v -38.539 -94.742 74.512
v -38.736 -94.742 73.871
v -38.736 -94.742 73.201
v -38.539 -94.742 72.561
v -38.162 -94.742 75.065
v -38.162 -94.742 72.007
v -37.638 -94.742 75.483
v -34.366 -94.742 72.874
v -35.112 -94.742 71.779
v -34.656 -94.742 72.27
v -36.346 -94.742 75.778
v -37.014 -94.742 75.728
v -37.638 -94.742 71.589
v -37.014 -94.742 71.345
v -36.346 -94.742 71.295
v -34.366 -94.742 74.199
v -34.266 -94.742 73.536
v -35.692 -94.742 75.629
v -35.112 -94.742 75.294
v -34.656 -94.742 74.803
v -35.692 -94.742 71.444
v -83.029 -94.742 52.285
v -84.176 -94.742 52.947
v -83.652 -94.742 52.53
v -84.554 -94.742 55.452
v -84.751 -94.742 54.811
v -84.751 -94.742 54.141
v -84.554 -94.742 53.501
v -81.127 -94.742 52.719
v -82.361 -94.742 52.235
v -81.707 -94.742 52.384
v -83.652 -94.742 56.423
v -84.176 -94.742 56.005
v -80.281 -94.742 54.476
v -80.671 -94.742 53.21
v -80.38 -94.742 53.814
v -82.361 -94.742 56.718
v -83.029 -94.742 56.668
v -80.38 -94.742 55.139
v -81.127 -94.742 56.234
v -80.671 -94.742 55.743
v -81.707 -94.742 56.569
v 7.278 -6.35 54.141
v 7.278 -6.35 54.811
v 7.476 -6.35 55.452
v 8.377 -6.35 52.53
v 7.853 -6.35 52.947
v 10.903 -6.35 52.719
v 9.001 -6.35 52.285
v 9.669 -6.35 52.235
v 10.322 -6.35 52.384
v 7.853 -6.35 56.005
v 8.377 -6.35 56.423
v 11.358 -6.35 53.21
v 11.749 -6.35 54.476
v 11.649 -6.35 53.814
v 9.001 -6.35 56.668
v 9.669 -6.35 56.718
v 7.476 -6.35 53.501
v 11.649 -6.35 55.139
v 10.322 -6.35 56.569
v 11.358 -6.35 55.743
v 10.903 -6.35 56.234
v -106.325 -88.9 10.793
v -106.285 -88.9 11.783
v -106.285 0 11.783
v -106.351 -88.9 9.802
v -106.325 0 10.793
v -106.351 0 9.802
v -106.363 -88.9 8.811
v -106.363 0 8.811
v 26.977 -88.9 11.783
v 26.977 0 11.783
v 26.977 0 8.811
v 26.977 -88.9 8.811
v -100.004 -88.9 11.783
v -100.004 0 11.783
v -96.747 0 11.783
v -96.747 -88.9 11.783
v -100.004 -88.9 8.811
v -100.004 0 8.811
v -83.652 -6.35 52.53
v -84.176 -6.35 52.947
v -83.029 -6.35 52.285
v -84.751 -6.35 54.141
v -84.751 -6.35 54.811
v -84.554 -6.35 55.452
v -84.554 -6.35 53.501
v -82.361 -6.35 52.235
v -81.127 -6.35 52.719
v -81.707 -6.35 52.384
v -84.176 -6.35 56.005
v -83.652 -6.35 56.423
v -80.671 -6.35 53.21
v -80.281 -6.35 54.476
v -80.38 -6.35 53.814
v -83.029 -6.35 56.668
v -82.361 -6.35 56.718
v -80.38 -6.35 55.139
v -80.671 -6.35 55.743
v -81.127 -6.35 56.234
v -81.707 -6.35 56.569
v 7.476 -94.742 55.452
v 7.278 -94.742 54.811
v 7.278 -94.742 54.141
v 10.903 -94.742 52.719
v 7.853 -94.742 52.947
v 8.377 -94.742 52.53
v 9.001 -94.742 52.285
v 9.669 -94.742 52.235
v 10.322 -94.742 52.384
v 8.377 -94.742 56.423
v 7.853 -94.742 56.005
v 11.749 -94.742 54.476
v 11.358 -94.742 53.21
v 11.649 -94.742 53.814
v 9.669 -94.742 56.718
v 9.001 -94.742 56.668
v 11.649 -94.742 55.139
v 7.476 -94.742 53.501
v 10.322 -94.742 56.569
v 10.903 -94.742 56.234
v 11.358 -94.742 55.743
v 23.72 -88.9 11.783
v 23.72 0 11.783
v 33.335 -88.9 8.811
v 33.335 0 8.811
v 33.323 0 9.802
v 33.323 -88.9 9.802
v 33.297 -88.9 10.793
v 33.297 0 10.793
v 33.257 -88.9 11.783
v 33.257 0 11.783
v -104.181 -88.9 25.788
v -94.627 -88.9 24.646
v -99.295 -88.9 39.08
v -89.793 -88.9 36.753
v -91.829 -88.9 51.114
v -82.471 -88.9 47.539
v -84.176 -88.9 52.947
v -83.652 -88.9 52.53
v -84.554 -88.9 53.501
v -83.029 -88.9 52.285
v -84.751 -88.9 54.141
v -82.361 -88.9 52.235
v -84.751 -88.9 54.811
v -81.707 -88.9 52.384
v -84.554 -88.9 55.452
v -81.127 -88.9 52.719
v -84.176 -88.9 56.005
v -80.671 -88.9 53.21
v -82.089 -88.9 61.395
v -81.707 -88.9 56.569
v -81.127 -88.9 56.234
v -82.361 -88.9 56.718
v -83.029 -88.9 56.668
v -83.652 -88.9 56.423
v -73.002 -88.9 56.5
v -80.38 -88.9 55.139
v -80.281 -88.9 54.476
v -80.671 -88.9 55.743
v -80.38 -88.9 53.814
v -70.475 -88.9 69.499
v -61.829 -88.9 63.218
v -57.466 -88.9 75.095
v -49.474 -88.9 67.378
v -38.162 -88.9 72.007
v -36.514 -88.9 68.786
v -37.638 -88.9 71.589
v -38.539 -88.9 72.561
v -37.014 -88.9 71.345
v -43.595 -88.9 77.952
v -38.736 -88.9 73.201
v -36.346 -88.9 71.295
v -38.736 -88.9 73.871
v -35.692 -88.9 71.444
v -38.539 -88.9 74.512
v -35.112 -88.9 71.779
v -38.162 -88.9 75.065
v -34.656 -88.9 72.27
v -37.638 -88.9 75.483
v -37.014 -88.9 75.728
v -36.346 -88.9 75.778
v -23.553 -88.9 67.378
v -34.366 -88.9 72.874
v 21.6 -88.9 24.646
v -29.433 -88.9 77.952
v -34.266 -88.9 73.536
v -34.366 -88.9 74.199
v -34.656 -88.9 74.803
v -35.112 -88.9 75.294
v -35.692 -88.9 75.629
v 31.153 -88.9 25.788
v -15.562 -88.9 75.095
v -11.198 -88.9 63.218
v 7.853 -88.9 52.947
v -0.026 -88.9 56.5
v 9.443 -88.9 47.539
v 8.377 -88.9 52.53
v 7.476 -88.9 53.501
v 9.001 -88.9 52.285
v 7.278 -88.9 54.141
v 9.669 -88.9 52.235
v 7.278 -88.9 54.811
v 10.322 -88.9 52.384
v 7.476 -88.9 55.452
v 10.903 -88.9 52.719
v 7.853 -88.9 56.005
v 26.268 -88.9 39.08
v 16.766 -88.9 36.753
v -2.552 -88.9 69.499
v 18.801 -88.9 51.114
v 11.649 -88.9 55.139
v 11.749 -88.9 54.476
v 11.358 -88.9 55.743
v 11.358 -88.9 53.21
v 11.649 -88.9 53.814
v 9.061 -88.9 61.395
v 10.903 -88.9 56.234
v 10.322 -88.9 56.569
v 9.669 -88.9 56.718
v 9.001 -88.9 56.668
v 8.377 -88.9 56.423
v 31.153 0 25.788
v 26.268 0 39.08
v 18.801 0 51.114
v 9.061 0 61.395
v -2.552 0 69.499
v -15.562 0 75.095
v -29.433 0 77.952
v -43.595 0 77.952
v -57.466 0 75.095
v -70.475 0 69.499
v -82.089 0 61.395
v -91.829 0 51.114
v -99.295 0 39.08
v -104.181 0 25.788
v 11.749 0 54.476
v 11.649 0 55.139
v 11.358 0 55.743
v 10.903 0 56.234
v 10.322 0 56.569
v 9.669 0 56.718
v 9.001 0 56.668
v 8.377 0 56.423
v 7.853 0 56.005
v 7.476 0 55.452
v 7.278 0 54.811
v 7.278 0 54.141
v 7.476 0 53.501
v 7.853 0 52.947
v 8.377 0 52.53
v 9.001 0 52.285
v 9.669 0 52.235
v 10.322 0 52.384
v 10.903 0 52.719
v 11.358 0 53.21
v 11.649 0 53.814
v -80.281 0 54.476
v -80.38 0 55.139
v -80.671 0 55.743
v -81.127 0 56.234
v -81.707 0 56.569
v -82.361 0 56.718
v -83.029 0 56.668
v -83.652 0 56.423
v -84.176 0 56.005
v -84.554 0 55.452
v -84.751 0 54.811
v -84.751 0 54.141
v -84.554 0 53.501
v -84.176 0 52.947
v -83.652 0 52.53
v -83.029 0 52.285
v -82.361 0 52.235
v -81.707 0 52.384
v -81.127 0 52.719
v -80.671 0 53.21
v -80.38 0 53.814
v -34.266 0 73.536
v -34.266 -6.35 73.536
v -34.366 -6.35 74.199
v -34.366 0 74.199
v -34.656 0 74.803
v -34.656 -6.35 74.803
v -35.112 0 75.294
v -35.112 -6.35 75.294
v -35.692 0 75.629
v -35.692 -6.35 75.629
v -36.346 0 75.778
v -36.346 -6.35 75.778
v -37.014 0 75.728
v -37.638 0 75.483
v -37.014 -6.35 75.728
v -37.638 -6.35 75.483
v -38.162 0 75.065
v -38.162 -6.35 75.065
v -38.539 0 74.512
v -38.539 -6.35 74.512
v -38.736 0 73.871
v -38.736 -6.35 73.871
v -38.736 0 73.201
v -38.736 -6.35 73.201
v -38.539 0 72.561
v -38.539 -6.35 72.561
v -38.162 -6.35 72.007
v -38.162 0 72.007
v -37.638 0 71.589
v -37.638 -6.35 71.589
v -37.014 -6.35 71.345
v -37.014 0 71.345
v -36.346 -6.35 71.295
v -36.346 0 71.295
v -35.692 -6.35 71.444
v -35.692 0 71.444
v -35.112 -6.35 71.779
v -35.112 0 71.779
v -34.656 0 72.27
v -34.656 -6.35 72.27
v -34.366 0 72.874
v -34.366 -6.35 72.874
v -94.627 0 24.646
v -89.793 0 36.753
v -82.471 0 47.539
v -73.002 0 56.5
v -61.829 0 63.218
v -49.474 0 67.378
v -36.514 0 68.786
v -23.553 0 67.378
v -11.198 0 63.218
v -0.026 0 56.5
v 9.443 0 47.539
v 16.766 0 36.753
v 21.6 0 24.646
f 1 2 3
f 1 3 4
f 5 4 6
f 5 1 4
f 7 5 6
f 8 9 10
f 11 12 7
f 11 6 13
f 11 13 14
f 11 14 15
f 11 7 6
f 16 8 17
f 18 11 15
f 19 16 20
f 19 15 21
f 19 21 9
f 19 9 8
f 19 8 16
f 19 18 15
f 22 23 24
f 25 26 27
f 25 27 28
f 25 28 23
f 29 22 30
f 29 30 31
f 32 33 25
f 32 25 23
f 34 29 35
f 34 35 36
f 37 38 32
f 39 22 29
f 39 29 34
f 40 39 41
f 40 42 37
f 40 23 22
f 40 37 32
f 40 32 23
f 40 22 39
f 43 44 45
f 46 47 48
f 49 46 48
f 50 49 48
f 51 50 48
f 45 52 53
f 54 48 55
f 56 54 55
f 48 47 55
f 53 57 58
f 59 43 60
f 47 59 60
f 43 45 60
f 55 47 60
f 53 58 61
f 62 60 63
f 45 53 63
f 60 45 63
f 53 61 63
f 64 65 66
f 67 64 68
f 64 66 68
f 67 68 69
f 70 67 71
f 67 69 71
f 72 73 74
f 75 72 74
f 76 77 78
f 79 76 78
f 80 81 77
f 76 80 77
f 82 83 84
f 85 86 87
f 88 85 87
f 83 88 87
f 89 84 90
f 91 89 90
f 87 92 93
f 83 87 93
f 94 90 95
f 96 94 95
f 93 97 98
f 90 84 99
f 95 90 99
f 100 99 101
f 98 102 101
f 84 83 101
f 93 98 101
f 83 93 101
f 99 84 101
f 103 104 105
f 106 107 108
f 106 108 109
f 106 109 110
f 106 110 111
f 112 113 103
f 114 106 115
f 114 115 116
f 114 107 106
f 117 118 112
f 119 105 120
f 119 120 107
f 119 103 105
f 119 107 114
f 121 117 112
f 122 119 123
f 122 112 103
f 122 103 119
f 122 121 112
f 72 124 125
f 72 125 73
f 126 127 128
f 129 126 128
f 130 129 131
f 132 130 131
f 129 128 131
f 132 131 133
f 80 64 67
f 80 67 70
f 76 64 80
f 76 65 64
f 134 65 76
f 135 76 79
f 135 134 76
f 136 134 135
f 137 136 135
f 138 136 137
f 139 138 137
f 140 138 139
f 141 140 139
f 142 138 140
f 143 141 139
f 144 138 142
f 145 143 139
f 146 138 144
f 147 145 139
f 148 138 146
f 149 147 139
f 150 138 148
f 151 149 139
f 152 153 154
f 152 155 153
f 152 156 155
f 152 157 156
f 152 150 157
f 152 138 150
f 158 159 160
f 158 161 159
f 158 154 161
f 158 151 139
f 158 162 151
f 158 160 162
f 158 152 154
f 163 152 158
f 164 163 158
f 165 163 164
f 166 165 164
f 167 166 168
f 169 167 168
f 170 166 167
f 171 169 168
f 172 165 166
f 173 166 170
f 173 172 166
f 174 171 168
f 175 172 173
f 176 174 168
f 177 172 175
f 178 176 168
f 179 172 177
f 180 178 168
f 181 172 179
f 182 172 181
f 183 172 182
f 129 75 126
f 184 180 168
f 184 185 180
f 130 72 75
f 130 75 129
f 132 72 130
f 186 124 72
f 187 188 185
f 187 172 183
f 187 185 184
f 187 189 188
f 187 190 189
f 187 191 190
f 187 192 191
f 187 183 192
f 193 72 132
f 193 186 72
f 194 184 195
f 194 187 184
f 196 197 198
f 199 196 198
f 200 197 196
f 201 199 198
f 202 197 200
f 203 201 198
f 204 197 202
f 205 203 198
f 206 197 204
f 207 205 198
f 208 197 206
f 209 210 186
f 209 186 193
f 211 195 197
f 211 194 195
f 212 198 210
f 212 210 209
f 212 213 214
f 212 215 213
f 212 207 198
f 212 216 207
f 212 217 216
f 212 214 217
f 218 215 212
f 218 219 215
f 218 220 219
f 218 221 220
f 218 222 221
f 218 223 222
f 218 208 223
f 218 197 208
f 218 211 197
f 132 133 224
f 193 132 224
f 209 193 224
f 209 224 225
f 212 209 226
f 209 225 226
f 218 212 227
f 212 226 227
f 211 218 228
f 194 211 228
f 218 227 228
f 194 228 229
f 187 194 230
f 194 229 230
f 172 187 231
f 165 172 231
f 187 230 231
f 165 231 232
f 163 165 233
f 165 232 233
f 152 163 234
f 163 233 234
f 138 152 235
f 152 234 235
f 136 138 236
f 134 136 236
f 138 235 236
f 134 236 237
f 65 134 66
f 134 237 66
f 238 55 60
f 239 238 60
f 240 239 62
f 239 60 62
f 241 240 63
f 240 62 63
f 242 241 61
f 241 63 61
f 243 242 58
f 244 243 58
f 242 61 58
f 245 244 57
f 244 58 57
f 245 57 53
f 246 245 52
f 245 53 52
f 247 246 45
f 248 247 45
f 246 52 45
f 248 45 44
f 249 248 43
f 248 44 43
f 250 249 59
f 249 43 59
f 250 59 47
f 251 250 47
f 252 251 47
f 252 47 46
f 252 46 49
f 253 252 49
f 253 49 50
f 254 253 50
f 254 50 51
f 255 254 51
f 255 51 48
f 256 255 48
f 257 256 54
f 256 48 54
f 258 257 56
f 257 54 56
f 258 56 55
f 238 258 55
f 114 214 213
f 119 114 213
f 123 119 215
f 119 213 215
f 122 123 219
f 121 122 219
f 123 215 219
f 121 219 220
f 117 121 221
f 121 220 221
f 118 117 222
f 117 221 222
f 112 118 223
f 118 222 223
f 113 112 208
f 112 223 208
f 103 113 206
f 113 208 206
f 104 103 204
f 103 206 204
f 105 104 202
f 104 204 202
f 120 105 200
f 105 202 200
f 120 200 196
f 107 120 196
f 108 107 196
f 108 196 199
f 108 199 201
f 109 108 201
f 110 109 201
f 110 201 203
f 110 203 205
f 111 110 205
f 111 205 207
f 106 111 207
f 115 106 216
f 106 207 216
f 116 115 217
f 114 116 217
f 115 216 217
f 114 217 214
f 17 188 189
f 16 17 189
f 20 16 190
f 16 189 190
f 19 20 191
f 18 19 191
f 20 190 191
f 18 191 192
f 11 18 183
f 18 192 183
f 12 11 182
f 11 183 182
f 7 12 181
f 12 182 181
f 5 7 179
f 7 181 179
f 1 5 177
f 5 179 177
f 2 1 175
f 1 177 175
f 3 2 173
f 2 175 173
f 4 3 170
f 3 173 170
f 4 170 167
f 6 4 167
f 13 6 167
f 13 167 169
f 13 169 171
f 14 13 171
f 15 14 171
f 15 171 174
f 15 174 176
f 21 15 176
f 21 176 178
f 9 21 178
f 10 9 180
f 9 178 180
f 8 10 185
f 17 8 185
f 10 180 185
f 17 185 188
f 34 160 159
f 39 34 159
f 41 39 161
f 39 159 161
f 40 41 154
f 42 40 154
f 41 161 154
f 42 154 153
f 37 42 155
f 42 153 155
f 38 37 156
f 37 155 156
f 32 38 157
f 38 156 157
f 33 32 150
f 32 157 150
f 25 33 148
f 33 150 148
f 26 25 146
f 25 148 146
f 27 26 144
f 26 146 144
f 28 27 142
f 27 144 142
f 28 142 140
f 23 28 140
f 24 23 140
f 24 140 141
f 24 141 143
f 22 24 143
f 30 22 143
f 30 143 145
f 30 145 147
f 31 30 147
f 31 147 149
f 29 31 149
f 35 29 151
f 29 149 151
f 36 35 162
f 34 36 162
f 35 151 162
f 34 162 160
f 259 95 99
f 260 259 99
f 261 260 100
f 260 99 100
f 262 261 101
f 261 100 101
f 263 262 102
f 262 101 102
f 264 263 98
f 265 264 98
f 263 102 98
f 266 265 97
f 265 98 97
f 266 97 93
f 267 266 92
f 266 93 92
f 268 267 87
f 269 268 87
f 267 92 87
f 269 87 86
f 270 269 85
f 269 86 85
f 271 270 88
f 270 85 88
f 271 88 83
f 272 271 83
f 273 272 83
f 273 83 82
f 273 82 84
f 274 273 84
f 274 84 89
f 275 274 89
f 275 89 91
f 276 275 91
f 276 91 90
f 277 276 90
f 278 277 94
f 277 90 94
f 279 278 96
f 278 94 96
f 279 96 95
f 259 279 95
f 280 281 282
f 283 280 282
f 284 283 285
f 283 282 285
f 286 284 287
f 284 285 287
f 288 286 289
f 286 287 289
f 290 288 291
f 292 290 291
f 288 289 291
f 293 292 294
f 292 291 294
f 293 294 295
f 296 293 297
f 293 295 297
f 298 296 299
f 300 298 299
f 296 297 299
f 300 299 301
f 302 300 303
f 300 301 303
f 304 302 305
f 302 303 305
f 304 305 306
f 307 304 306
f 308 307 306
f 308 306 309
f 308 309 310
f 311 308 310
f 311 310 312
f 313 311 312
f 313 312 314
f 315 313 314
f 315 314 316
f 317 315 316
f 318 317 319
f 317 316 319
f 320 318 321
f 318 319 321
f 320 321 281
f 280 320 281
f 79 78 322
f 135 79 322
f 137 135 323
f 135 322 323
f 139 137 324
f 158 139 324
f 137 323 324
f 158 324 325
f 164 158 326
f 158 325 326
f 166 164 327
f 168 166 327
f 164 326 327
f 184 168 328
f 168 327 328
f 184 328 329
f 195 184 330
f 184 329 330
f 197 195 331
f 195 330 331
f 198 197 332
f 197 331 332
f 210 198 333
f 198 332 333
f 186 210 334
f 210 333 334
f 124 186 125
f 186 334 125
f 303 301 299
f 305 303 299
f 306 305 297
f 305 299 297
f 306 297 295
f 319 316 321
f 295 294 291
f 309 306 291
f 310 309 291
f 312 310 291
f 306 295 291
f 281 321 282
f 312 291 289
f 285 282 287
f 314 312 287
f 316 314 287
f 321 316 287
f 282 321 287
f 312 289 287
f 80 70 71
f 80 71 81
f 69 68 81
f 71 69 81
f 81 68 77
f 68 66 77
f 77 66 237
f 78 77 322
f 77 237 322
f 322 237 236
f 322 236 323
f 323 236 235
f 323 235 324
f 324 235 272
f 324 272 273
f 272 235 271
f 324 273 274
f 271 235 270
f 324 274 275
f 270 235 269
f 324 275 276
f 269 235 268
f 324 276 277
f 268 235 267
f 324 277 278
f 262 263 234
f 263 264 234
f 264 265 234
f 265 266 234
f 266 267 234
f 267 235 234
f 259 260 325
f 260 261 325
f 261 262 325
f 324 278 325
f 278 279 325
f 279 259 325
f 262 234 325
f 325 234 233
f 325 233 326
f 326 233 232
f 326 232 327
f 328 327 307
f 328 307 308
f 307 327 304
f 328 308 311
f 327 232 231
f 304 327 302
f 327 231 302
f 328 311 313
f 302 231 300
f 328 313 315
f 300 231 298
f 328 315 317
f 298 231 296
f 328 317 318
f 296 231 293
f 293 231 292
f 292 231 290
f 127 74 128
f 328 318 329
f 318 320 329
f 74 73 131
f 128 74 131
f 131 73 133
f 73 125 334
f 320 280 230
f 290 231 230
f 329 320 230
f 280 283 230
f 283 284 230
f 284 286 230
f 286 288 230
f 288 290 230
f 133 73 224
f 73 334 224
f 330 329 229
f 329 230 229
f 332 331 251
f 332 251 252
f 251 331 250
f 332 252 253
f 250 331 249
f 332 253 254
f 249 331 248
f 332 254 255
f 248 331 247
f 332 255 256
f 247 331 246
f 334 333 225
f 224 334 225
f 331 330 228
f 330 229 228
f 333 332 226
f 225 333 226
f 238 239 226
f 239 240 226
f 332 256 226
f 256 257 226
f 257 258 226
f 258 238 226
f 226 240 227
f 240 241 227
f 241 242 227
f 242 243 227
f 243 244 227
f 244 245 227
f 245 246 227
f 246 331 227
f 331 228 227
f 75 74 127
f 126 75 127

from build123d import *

# Parameters (mm, degrees)
F1_DEPTH = 88.9
F2_R     = 2.2479
F3_DEPTH = 5.842
F4_START = -82.55
F4_DEPTH = 6.35


with BuildPart() as f1:
    # F0 (on Front) → F1 (new body)
    with BuildSketch(Plane.XZ):
        with BuildLine():
            Line((26.9766840256, 11.7828417273), (30.0785363078, 11.7828417273))
            ThreePointArc((30.0785363078, 11.7828417273), (-36.5136837388, 75.1364181979), (-103.1059037855, 11.7828417273))
            Line((-103.1059037855, 11.7828417273), (-100.0040515032, 11.7828417273))
            Line((-100.0040515032, 11.7828417273), (-96.7471775005, 11.7828417273))
            ThreePointArc((-96.7471775005, 11.7828417273), (-36.5136837388, 68.7864181979), (23.7198100229, 11.7828417273))
            Line((23.7198100229, 11.7828417273), (26.9766840256, 11.7828417273))
        make_face()
        with BuildLine():
            Line((-100.0040515032, 11.7828417273), (-103.1059037855, 11.7828417273))
            ThreePointArc((-103.1059037855, 11.7828417273), (-103.1634009398, 10.2973980525), (-103.1877670725, 8.8110417273))
            Line((-103.1877670725, 8.8110417273), (-100.0040515032, 8.8110417273))
            Line((-100.0040515032, 8.8110417273), (-100.0040515032, 11.7828417273))
        make_face()
        with BuildLine():
            Line((26.9766840256, 8.8110417273), (30.1603995949, 8.8110417273))
            ThreePointArc((30.1603995949, 8.8110417273), (30.1360334622, 10.2973980525), (30.0785363078, 11.7828417273))
            Line((30.0785363078, 11.7828417273), (26.9766840256, 11.7828417273))
            Line((26.9766840256, 11.7828417273), (26.9766840256, 8.8110417273))
        make_face()
        with BuildLine():
            Line((30.1603995949, 8.8110417273), (33.335441262, 8.8110417273))
            ThreePointArc((33.335441262, 8.8110417273), (33.312184154, 10.2973574694), (33.2573033958, 11.7828417273))
            Line((33.2573033958, 11.7828417273), (30.0785363078, 11.7828417273))
            ThreePointArc((30.0785363078, 11.7828417273), (30.1360334622, 10.2973980525), (30.1603995949, 8.8110417273))
        make_face()
        with BuildLine():
            Line((30.0785363078, 11.7828417273), (33.2573033958, 11.7828417273))
            ThreePointArc((33.2573033958, 11.7828417273), (-36.5136837388, 78.3114181979), (-106.2846708734, 11.7828417273))
            Line((-106.2846708734, 11.7828417273), (-103.1059037855, 11.7828417273))
            ThreePointArc((-103.1059037855, 11.7828417273), (-36.5136837388, 75.1364181979), (30.0785363078, 11.7828417273))
        make_face()
        with BuildLine():
            Line((-103.1059037855, 11.7828417273), (-106.2846708734, 11.7828417273))
            ThreePointArc((-106.2846708734, 11.7828417273), (-106.3395516317, 10.2973574694), (-106.3628087397, 8.8110417273))
            Line((-106.3628087397, 8.8110417273), (-103.1877670725, 8.8110417273))
            ThreePointArc((-103.1877670725, 8.8110417273), (-103.1634009398, 10.2973980525), (-103.1059037855, 11.7828417273))
        make_face()
    extrude(amount=F1_DEPTH)

    # F2 (on face) → F3 (join)
    with BuildSketch(Plane.XZ.offset(88.9)):
        with Locations((-36.5136837388, 73.5362181979)):
            Circle(F2_R)
        with Locations((9.5011486255, 54.4762505622)):
            Circle(F2_R)
        with Locations((-82.5285161032, 54.4762505622)):
            Circle(F2_R)
    extrude(amount=F3_DEPTH)

    # F2 (on face) → F4 (cut)
    with BuildSketch(Plane.XZ.offset(88.9).offset(F4_START)):
        with Locations((-82.5285161032, 54.4762505622)):
            Circle(F2_R)
        with Locations((-36.5136837388, 73.5362181979)):
            Circle(F2_R)
        with Locations((9.5011486255, 54.4762505622)):
            Circle(F2_R)
    extrude(amount=-F4_DEPTH, mode=Mode.SUBTRACT)


solid = f1.part
